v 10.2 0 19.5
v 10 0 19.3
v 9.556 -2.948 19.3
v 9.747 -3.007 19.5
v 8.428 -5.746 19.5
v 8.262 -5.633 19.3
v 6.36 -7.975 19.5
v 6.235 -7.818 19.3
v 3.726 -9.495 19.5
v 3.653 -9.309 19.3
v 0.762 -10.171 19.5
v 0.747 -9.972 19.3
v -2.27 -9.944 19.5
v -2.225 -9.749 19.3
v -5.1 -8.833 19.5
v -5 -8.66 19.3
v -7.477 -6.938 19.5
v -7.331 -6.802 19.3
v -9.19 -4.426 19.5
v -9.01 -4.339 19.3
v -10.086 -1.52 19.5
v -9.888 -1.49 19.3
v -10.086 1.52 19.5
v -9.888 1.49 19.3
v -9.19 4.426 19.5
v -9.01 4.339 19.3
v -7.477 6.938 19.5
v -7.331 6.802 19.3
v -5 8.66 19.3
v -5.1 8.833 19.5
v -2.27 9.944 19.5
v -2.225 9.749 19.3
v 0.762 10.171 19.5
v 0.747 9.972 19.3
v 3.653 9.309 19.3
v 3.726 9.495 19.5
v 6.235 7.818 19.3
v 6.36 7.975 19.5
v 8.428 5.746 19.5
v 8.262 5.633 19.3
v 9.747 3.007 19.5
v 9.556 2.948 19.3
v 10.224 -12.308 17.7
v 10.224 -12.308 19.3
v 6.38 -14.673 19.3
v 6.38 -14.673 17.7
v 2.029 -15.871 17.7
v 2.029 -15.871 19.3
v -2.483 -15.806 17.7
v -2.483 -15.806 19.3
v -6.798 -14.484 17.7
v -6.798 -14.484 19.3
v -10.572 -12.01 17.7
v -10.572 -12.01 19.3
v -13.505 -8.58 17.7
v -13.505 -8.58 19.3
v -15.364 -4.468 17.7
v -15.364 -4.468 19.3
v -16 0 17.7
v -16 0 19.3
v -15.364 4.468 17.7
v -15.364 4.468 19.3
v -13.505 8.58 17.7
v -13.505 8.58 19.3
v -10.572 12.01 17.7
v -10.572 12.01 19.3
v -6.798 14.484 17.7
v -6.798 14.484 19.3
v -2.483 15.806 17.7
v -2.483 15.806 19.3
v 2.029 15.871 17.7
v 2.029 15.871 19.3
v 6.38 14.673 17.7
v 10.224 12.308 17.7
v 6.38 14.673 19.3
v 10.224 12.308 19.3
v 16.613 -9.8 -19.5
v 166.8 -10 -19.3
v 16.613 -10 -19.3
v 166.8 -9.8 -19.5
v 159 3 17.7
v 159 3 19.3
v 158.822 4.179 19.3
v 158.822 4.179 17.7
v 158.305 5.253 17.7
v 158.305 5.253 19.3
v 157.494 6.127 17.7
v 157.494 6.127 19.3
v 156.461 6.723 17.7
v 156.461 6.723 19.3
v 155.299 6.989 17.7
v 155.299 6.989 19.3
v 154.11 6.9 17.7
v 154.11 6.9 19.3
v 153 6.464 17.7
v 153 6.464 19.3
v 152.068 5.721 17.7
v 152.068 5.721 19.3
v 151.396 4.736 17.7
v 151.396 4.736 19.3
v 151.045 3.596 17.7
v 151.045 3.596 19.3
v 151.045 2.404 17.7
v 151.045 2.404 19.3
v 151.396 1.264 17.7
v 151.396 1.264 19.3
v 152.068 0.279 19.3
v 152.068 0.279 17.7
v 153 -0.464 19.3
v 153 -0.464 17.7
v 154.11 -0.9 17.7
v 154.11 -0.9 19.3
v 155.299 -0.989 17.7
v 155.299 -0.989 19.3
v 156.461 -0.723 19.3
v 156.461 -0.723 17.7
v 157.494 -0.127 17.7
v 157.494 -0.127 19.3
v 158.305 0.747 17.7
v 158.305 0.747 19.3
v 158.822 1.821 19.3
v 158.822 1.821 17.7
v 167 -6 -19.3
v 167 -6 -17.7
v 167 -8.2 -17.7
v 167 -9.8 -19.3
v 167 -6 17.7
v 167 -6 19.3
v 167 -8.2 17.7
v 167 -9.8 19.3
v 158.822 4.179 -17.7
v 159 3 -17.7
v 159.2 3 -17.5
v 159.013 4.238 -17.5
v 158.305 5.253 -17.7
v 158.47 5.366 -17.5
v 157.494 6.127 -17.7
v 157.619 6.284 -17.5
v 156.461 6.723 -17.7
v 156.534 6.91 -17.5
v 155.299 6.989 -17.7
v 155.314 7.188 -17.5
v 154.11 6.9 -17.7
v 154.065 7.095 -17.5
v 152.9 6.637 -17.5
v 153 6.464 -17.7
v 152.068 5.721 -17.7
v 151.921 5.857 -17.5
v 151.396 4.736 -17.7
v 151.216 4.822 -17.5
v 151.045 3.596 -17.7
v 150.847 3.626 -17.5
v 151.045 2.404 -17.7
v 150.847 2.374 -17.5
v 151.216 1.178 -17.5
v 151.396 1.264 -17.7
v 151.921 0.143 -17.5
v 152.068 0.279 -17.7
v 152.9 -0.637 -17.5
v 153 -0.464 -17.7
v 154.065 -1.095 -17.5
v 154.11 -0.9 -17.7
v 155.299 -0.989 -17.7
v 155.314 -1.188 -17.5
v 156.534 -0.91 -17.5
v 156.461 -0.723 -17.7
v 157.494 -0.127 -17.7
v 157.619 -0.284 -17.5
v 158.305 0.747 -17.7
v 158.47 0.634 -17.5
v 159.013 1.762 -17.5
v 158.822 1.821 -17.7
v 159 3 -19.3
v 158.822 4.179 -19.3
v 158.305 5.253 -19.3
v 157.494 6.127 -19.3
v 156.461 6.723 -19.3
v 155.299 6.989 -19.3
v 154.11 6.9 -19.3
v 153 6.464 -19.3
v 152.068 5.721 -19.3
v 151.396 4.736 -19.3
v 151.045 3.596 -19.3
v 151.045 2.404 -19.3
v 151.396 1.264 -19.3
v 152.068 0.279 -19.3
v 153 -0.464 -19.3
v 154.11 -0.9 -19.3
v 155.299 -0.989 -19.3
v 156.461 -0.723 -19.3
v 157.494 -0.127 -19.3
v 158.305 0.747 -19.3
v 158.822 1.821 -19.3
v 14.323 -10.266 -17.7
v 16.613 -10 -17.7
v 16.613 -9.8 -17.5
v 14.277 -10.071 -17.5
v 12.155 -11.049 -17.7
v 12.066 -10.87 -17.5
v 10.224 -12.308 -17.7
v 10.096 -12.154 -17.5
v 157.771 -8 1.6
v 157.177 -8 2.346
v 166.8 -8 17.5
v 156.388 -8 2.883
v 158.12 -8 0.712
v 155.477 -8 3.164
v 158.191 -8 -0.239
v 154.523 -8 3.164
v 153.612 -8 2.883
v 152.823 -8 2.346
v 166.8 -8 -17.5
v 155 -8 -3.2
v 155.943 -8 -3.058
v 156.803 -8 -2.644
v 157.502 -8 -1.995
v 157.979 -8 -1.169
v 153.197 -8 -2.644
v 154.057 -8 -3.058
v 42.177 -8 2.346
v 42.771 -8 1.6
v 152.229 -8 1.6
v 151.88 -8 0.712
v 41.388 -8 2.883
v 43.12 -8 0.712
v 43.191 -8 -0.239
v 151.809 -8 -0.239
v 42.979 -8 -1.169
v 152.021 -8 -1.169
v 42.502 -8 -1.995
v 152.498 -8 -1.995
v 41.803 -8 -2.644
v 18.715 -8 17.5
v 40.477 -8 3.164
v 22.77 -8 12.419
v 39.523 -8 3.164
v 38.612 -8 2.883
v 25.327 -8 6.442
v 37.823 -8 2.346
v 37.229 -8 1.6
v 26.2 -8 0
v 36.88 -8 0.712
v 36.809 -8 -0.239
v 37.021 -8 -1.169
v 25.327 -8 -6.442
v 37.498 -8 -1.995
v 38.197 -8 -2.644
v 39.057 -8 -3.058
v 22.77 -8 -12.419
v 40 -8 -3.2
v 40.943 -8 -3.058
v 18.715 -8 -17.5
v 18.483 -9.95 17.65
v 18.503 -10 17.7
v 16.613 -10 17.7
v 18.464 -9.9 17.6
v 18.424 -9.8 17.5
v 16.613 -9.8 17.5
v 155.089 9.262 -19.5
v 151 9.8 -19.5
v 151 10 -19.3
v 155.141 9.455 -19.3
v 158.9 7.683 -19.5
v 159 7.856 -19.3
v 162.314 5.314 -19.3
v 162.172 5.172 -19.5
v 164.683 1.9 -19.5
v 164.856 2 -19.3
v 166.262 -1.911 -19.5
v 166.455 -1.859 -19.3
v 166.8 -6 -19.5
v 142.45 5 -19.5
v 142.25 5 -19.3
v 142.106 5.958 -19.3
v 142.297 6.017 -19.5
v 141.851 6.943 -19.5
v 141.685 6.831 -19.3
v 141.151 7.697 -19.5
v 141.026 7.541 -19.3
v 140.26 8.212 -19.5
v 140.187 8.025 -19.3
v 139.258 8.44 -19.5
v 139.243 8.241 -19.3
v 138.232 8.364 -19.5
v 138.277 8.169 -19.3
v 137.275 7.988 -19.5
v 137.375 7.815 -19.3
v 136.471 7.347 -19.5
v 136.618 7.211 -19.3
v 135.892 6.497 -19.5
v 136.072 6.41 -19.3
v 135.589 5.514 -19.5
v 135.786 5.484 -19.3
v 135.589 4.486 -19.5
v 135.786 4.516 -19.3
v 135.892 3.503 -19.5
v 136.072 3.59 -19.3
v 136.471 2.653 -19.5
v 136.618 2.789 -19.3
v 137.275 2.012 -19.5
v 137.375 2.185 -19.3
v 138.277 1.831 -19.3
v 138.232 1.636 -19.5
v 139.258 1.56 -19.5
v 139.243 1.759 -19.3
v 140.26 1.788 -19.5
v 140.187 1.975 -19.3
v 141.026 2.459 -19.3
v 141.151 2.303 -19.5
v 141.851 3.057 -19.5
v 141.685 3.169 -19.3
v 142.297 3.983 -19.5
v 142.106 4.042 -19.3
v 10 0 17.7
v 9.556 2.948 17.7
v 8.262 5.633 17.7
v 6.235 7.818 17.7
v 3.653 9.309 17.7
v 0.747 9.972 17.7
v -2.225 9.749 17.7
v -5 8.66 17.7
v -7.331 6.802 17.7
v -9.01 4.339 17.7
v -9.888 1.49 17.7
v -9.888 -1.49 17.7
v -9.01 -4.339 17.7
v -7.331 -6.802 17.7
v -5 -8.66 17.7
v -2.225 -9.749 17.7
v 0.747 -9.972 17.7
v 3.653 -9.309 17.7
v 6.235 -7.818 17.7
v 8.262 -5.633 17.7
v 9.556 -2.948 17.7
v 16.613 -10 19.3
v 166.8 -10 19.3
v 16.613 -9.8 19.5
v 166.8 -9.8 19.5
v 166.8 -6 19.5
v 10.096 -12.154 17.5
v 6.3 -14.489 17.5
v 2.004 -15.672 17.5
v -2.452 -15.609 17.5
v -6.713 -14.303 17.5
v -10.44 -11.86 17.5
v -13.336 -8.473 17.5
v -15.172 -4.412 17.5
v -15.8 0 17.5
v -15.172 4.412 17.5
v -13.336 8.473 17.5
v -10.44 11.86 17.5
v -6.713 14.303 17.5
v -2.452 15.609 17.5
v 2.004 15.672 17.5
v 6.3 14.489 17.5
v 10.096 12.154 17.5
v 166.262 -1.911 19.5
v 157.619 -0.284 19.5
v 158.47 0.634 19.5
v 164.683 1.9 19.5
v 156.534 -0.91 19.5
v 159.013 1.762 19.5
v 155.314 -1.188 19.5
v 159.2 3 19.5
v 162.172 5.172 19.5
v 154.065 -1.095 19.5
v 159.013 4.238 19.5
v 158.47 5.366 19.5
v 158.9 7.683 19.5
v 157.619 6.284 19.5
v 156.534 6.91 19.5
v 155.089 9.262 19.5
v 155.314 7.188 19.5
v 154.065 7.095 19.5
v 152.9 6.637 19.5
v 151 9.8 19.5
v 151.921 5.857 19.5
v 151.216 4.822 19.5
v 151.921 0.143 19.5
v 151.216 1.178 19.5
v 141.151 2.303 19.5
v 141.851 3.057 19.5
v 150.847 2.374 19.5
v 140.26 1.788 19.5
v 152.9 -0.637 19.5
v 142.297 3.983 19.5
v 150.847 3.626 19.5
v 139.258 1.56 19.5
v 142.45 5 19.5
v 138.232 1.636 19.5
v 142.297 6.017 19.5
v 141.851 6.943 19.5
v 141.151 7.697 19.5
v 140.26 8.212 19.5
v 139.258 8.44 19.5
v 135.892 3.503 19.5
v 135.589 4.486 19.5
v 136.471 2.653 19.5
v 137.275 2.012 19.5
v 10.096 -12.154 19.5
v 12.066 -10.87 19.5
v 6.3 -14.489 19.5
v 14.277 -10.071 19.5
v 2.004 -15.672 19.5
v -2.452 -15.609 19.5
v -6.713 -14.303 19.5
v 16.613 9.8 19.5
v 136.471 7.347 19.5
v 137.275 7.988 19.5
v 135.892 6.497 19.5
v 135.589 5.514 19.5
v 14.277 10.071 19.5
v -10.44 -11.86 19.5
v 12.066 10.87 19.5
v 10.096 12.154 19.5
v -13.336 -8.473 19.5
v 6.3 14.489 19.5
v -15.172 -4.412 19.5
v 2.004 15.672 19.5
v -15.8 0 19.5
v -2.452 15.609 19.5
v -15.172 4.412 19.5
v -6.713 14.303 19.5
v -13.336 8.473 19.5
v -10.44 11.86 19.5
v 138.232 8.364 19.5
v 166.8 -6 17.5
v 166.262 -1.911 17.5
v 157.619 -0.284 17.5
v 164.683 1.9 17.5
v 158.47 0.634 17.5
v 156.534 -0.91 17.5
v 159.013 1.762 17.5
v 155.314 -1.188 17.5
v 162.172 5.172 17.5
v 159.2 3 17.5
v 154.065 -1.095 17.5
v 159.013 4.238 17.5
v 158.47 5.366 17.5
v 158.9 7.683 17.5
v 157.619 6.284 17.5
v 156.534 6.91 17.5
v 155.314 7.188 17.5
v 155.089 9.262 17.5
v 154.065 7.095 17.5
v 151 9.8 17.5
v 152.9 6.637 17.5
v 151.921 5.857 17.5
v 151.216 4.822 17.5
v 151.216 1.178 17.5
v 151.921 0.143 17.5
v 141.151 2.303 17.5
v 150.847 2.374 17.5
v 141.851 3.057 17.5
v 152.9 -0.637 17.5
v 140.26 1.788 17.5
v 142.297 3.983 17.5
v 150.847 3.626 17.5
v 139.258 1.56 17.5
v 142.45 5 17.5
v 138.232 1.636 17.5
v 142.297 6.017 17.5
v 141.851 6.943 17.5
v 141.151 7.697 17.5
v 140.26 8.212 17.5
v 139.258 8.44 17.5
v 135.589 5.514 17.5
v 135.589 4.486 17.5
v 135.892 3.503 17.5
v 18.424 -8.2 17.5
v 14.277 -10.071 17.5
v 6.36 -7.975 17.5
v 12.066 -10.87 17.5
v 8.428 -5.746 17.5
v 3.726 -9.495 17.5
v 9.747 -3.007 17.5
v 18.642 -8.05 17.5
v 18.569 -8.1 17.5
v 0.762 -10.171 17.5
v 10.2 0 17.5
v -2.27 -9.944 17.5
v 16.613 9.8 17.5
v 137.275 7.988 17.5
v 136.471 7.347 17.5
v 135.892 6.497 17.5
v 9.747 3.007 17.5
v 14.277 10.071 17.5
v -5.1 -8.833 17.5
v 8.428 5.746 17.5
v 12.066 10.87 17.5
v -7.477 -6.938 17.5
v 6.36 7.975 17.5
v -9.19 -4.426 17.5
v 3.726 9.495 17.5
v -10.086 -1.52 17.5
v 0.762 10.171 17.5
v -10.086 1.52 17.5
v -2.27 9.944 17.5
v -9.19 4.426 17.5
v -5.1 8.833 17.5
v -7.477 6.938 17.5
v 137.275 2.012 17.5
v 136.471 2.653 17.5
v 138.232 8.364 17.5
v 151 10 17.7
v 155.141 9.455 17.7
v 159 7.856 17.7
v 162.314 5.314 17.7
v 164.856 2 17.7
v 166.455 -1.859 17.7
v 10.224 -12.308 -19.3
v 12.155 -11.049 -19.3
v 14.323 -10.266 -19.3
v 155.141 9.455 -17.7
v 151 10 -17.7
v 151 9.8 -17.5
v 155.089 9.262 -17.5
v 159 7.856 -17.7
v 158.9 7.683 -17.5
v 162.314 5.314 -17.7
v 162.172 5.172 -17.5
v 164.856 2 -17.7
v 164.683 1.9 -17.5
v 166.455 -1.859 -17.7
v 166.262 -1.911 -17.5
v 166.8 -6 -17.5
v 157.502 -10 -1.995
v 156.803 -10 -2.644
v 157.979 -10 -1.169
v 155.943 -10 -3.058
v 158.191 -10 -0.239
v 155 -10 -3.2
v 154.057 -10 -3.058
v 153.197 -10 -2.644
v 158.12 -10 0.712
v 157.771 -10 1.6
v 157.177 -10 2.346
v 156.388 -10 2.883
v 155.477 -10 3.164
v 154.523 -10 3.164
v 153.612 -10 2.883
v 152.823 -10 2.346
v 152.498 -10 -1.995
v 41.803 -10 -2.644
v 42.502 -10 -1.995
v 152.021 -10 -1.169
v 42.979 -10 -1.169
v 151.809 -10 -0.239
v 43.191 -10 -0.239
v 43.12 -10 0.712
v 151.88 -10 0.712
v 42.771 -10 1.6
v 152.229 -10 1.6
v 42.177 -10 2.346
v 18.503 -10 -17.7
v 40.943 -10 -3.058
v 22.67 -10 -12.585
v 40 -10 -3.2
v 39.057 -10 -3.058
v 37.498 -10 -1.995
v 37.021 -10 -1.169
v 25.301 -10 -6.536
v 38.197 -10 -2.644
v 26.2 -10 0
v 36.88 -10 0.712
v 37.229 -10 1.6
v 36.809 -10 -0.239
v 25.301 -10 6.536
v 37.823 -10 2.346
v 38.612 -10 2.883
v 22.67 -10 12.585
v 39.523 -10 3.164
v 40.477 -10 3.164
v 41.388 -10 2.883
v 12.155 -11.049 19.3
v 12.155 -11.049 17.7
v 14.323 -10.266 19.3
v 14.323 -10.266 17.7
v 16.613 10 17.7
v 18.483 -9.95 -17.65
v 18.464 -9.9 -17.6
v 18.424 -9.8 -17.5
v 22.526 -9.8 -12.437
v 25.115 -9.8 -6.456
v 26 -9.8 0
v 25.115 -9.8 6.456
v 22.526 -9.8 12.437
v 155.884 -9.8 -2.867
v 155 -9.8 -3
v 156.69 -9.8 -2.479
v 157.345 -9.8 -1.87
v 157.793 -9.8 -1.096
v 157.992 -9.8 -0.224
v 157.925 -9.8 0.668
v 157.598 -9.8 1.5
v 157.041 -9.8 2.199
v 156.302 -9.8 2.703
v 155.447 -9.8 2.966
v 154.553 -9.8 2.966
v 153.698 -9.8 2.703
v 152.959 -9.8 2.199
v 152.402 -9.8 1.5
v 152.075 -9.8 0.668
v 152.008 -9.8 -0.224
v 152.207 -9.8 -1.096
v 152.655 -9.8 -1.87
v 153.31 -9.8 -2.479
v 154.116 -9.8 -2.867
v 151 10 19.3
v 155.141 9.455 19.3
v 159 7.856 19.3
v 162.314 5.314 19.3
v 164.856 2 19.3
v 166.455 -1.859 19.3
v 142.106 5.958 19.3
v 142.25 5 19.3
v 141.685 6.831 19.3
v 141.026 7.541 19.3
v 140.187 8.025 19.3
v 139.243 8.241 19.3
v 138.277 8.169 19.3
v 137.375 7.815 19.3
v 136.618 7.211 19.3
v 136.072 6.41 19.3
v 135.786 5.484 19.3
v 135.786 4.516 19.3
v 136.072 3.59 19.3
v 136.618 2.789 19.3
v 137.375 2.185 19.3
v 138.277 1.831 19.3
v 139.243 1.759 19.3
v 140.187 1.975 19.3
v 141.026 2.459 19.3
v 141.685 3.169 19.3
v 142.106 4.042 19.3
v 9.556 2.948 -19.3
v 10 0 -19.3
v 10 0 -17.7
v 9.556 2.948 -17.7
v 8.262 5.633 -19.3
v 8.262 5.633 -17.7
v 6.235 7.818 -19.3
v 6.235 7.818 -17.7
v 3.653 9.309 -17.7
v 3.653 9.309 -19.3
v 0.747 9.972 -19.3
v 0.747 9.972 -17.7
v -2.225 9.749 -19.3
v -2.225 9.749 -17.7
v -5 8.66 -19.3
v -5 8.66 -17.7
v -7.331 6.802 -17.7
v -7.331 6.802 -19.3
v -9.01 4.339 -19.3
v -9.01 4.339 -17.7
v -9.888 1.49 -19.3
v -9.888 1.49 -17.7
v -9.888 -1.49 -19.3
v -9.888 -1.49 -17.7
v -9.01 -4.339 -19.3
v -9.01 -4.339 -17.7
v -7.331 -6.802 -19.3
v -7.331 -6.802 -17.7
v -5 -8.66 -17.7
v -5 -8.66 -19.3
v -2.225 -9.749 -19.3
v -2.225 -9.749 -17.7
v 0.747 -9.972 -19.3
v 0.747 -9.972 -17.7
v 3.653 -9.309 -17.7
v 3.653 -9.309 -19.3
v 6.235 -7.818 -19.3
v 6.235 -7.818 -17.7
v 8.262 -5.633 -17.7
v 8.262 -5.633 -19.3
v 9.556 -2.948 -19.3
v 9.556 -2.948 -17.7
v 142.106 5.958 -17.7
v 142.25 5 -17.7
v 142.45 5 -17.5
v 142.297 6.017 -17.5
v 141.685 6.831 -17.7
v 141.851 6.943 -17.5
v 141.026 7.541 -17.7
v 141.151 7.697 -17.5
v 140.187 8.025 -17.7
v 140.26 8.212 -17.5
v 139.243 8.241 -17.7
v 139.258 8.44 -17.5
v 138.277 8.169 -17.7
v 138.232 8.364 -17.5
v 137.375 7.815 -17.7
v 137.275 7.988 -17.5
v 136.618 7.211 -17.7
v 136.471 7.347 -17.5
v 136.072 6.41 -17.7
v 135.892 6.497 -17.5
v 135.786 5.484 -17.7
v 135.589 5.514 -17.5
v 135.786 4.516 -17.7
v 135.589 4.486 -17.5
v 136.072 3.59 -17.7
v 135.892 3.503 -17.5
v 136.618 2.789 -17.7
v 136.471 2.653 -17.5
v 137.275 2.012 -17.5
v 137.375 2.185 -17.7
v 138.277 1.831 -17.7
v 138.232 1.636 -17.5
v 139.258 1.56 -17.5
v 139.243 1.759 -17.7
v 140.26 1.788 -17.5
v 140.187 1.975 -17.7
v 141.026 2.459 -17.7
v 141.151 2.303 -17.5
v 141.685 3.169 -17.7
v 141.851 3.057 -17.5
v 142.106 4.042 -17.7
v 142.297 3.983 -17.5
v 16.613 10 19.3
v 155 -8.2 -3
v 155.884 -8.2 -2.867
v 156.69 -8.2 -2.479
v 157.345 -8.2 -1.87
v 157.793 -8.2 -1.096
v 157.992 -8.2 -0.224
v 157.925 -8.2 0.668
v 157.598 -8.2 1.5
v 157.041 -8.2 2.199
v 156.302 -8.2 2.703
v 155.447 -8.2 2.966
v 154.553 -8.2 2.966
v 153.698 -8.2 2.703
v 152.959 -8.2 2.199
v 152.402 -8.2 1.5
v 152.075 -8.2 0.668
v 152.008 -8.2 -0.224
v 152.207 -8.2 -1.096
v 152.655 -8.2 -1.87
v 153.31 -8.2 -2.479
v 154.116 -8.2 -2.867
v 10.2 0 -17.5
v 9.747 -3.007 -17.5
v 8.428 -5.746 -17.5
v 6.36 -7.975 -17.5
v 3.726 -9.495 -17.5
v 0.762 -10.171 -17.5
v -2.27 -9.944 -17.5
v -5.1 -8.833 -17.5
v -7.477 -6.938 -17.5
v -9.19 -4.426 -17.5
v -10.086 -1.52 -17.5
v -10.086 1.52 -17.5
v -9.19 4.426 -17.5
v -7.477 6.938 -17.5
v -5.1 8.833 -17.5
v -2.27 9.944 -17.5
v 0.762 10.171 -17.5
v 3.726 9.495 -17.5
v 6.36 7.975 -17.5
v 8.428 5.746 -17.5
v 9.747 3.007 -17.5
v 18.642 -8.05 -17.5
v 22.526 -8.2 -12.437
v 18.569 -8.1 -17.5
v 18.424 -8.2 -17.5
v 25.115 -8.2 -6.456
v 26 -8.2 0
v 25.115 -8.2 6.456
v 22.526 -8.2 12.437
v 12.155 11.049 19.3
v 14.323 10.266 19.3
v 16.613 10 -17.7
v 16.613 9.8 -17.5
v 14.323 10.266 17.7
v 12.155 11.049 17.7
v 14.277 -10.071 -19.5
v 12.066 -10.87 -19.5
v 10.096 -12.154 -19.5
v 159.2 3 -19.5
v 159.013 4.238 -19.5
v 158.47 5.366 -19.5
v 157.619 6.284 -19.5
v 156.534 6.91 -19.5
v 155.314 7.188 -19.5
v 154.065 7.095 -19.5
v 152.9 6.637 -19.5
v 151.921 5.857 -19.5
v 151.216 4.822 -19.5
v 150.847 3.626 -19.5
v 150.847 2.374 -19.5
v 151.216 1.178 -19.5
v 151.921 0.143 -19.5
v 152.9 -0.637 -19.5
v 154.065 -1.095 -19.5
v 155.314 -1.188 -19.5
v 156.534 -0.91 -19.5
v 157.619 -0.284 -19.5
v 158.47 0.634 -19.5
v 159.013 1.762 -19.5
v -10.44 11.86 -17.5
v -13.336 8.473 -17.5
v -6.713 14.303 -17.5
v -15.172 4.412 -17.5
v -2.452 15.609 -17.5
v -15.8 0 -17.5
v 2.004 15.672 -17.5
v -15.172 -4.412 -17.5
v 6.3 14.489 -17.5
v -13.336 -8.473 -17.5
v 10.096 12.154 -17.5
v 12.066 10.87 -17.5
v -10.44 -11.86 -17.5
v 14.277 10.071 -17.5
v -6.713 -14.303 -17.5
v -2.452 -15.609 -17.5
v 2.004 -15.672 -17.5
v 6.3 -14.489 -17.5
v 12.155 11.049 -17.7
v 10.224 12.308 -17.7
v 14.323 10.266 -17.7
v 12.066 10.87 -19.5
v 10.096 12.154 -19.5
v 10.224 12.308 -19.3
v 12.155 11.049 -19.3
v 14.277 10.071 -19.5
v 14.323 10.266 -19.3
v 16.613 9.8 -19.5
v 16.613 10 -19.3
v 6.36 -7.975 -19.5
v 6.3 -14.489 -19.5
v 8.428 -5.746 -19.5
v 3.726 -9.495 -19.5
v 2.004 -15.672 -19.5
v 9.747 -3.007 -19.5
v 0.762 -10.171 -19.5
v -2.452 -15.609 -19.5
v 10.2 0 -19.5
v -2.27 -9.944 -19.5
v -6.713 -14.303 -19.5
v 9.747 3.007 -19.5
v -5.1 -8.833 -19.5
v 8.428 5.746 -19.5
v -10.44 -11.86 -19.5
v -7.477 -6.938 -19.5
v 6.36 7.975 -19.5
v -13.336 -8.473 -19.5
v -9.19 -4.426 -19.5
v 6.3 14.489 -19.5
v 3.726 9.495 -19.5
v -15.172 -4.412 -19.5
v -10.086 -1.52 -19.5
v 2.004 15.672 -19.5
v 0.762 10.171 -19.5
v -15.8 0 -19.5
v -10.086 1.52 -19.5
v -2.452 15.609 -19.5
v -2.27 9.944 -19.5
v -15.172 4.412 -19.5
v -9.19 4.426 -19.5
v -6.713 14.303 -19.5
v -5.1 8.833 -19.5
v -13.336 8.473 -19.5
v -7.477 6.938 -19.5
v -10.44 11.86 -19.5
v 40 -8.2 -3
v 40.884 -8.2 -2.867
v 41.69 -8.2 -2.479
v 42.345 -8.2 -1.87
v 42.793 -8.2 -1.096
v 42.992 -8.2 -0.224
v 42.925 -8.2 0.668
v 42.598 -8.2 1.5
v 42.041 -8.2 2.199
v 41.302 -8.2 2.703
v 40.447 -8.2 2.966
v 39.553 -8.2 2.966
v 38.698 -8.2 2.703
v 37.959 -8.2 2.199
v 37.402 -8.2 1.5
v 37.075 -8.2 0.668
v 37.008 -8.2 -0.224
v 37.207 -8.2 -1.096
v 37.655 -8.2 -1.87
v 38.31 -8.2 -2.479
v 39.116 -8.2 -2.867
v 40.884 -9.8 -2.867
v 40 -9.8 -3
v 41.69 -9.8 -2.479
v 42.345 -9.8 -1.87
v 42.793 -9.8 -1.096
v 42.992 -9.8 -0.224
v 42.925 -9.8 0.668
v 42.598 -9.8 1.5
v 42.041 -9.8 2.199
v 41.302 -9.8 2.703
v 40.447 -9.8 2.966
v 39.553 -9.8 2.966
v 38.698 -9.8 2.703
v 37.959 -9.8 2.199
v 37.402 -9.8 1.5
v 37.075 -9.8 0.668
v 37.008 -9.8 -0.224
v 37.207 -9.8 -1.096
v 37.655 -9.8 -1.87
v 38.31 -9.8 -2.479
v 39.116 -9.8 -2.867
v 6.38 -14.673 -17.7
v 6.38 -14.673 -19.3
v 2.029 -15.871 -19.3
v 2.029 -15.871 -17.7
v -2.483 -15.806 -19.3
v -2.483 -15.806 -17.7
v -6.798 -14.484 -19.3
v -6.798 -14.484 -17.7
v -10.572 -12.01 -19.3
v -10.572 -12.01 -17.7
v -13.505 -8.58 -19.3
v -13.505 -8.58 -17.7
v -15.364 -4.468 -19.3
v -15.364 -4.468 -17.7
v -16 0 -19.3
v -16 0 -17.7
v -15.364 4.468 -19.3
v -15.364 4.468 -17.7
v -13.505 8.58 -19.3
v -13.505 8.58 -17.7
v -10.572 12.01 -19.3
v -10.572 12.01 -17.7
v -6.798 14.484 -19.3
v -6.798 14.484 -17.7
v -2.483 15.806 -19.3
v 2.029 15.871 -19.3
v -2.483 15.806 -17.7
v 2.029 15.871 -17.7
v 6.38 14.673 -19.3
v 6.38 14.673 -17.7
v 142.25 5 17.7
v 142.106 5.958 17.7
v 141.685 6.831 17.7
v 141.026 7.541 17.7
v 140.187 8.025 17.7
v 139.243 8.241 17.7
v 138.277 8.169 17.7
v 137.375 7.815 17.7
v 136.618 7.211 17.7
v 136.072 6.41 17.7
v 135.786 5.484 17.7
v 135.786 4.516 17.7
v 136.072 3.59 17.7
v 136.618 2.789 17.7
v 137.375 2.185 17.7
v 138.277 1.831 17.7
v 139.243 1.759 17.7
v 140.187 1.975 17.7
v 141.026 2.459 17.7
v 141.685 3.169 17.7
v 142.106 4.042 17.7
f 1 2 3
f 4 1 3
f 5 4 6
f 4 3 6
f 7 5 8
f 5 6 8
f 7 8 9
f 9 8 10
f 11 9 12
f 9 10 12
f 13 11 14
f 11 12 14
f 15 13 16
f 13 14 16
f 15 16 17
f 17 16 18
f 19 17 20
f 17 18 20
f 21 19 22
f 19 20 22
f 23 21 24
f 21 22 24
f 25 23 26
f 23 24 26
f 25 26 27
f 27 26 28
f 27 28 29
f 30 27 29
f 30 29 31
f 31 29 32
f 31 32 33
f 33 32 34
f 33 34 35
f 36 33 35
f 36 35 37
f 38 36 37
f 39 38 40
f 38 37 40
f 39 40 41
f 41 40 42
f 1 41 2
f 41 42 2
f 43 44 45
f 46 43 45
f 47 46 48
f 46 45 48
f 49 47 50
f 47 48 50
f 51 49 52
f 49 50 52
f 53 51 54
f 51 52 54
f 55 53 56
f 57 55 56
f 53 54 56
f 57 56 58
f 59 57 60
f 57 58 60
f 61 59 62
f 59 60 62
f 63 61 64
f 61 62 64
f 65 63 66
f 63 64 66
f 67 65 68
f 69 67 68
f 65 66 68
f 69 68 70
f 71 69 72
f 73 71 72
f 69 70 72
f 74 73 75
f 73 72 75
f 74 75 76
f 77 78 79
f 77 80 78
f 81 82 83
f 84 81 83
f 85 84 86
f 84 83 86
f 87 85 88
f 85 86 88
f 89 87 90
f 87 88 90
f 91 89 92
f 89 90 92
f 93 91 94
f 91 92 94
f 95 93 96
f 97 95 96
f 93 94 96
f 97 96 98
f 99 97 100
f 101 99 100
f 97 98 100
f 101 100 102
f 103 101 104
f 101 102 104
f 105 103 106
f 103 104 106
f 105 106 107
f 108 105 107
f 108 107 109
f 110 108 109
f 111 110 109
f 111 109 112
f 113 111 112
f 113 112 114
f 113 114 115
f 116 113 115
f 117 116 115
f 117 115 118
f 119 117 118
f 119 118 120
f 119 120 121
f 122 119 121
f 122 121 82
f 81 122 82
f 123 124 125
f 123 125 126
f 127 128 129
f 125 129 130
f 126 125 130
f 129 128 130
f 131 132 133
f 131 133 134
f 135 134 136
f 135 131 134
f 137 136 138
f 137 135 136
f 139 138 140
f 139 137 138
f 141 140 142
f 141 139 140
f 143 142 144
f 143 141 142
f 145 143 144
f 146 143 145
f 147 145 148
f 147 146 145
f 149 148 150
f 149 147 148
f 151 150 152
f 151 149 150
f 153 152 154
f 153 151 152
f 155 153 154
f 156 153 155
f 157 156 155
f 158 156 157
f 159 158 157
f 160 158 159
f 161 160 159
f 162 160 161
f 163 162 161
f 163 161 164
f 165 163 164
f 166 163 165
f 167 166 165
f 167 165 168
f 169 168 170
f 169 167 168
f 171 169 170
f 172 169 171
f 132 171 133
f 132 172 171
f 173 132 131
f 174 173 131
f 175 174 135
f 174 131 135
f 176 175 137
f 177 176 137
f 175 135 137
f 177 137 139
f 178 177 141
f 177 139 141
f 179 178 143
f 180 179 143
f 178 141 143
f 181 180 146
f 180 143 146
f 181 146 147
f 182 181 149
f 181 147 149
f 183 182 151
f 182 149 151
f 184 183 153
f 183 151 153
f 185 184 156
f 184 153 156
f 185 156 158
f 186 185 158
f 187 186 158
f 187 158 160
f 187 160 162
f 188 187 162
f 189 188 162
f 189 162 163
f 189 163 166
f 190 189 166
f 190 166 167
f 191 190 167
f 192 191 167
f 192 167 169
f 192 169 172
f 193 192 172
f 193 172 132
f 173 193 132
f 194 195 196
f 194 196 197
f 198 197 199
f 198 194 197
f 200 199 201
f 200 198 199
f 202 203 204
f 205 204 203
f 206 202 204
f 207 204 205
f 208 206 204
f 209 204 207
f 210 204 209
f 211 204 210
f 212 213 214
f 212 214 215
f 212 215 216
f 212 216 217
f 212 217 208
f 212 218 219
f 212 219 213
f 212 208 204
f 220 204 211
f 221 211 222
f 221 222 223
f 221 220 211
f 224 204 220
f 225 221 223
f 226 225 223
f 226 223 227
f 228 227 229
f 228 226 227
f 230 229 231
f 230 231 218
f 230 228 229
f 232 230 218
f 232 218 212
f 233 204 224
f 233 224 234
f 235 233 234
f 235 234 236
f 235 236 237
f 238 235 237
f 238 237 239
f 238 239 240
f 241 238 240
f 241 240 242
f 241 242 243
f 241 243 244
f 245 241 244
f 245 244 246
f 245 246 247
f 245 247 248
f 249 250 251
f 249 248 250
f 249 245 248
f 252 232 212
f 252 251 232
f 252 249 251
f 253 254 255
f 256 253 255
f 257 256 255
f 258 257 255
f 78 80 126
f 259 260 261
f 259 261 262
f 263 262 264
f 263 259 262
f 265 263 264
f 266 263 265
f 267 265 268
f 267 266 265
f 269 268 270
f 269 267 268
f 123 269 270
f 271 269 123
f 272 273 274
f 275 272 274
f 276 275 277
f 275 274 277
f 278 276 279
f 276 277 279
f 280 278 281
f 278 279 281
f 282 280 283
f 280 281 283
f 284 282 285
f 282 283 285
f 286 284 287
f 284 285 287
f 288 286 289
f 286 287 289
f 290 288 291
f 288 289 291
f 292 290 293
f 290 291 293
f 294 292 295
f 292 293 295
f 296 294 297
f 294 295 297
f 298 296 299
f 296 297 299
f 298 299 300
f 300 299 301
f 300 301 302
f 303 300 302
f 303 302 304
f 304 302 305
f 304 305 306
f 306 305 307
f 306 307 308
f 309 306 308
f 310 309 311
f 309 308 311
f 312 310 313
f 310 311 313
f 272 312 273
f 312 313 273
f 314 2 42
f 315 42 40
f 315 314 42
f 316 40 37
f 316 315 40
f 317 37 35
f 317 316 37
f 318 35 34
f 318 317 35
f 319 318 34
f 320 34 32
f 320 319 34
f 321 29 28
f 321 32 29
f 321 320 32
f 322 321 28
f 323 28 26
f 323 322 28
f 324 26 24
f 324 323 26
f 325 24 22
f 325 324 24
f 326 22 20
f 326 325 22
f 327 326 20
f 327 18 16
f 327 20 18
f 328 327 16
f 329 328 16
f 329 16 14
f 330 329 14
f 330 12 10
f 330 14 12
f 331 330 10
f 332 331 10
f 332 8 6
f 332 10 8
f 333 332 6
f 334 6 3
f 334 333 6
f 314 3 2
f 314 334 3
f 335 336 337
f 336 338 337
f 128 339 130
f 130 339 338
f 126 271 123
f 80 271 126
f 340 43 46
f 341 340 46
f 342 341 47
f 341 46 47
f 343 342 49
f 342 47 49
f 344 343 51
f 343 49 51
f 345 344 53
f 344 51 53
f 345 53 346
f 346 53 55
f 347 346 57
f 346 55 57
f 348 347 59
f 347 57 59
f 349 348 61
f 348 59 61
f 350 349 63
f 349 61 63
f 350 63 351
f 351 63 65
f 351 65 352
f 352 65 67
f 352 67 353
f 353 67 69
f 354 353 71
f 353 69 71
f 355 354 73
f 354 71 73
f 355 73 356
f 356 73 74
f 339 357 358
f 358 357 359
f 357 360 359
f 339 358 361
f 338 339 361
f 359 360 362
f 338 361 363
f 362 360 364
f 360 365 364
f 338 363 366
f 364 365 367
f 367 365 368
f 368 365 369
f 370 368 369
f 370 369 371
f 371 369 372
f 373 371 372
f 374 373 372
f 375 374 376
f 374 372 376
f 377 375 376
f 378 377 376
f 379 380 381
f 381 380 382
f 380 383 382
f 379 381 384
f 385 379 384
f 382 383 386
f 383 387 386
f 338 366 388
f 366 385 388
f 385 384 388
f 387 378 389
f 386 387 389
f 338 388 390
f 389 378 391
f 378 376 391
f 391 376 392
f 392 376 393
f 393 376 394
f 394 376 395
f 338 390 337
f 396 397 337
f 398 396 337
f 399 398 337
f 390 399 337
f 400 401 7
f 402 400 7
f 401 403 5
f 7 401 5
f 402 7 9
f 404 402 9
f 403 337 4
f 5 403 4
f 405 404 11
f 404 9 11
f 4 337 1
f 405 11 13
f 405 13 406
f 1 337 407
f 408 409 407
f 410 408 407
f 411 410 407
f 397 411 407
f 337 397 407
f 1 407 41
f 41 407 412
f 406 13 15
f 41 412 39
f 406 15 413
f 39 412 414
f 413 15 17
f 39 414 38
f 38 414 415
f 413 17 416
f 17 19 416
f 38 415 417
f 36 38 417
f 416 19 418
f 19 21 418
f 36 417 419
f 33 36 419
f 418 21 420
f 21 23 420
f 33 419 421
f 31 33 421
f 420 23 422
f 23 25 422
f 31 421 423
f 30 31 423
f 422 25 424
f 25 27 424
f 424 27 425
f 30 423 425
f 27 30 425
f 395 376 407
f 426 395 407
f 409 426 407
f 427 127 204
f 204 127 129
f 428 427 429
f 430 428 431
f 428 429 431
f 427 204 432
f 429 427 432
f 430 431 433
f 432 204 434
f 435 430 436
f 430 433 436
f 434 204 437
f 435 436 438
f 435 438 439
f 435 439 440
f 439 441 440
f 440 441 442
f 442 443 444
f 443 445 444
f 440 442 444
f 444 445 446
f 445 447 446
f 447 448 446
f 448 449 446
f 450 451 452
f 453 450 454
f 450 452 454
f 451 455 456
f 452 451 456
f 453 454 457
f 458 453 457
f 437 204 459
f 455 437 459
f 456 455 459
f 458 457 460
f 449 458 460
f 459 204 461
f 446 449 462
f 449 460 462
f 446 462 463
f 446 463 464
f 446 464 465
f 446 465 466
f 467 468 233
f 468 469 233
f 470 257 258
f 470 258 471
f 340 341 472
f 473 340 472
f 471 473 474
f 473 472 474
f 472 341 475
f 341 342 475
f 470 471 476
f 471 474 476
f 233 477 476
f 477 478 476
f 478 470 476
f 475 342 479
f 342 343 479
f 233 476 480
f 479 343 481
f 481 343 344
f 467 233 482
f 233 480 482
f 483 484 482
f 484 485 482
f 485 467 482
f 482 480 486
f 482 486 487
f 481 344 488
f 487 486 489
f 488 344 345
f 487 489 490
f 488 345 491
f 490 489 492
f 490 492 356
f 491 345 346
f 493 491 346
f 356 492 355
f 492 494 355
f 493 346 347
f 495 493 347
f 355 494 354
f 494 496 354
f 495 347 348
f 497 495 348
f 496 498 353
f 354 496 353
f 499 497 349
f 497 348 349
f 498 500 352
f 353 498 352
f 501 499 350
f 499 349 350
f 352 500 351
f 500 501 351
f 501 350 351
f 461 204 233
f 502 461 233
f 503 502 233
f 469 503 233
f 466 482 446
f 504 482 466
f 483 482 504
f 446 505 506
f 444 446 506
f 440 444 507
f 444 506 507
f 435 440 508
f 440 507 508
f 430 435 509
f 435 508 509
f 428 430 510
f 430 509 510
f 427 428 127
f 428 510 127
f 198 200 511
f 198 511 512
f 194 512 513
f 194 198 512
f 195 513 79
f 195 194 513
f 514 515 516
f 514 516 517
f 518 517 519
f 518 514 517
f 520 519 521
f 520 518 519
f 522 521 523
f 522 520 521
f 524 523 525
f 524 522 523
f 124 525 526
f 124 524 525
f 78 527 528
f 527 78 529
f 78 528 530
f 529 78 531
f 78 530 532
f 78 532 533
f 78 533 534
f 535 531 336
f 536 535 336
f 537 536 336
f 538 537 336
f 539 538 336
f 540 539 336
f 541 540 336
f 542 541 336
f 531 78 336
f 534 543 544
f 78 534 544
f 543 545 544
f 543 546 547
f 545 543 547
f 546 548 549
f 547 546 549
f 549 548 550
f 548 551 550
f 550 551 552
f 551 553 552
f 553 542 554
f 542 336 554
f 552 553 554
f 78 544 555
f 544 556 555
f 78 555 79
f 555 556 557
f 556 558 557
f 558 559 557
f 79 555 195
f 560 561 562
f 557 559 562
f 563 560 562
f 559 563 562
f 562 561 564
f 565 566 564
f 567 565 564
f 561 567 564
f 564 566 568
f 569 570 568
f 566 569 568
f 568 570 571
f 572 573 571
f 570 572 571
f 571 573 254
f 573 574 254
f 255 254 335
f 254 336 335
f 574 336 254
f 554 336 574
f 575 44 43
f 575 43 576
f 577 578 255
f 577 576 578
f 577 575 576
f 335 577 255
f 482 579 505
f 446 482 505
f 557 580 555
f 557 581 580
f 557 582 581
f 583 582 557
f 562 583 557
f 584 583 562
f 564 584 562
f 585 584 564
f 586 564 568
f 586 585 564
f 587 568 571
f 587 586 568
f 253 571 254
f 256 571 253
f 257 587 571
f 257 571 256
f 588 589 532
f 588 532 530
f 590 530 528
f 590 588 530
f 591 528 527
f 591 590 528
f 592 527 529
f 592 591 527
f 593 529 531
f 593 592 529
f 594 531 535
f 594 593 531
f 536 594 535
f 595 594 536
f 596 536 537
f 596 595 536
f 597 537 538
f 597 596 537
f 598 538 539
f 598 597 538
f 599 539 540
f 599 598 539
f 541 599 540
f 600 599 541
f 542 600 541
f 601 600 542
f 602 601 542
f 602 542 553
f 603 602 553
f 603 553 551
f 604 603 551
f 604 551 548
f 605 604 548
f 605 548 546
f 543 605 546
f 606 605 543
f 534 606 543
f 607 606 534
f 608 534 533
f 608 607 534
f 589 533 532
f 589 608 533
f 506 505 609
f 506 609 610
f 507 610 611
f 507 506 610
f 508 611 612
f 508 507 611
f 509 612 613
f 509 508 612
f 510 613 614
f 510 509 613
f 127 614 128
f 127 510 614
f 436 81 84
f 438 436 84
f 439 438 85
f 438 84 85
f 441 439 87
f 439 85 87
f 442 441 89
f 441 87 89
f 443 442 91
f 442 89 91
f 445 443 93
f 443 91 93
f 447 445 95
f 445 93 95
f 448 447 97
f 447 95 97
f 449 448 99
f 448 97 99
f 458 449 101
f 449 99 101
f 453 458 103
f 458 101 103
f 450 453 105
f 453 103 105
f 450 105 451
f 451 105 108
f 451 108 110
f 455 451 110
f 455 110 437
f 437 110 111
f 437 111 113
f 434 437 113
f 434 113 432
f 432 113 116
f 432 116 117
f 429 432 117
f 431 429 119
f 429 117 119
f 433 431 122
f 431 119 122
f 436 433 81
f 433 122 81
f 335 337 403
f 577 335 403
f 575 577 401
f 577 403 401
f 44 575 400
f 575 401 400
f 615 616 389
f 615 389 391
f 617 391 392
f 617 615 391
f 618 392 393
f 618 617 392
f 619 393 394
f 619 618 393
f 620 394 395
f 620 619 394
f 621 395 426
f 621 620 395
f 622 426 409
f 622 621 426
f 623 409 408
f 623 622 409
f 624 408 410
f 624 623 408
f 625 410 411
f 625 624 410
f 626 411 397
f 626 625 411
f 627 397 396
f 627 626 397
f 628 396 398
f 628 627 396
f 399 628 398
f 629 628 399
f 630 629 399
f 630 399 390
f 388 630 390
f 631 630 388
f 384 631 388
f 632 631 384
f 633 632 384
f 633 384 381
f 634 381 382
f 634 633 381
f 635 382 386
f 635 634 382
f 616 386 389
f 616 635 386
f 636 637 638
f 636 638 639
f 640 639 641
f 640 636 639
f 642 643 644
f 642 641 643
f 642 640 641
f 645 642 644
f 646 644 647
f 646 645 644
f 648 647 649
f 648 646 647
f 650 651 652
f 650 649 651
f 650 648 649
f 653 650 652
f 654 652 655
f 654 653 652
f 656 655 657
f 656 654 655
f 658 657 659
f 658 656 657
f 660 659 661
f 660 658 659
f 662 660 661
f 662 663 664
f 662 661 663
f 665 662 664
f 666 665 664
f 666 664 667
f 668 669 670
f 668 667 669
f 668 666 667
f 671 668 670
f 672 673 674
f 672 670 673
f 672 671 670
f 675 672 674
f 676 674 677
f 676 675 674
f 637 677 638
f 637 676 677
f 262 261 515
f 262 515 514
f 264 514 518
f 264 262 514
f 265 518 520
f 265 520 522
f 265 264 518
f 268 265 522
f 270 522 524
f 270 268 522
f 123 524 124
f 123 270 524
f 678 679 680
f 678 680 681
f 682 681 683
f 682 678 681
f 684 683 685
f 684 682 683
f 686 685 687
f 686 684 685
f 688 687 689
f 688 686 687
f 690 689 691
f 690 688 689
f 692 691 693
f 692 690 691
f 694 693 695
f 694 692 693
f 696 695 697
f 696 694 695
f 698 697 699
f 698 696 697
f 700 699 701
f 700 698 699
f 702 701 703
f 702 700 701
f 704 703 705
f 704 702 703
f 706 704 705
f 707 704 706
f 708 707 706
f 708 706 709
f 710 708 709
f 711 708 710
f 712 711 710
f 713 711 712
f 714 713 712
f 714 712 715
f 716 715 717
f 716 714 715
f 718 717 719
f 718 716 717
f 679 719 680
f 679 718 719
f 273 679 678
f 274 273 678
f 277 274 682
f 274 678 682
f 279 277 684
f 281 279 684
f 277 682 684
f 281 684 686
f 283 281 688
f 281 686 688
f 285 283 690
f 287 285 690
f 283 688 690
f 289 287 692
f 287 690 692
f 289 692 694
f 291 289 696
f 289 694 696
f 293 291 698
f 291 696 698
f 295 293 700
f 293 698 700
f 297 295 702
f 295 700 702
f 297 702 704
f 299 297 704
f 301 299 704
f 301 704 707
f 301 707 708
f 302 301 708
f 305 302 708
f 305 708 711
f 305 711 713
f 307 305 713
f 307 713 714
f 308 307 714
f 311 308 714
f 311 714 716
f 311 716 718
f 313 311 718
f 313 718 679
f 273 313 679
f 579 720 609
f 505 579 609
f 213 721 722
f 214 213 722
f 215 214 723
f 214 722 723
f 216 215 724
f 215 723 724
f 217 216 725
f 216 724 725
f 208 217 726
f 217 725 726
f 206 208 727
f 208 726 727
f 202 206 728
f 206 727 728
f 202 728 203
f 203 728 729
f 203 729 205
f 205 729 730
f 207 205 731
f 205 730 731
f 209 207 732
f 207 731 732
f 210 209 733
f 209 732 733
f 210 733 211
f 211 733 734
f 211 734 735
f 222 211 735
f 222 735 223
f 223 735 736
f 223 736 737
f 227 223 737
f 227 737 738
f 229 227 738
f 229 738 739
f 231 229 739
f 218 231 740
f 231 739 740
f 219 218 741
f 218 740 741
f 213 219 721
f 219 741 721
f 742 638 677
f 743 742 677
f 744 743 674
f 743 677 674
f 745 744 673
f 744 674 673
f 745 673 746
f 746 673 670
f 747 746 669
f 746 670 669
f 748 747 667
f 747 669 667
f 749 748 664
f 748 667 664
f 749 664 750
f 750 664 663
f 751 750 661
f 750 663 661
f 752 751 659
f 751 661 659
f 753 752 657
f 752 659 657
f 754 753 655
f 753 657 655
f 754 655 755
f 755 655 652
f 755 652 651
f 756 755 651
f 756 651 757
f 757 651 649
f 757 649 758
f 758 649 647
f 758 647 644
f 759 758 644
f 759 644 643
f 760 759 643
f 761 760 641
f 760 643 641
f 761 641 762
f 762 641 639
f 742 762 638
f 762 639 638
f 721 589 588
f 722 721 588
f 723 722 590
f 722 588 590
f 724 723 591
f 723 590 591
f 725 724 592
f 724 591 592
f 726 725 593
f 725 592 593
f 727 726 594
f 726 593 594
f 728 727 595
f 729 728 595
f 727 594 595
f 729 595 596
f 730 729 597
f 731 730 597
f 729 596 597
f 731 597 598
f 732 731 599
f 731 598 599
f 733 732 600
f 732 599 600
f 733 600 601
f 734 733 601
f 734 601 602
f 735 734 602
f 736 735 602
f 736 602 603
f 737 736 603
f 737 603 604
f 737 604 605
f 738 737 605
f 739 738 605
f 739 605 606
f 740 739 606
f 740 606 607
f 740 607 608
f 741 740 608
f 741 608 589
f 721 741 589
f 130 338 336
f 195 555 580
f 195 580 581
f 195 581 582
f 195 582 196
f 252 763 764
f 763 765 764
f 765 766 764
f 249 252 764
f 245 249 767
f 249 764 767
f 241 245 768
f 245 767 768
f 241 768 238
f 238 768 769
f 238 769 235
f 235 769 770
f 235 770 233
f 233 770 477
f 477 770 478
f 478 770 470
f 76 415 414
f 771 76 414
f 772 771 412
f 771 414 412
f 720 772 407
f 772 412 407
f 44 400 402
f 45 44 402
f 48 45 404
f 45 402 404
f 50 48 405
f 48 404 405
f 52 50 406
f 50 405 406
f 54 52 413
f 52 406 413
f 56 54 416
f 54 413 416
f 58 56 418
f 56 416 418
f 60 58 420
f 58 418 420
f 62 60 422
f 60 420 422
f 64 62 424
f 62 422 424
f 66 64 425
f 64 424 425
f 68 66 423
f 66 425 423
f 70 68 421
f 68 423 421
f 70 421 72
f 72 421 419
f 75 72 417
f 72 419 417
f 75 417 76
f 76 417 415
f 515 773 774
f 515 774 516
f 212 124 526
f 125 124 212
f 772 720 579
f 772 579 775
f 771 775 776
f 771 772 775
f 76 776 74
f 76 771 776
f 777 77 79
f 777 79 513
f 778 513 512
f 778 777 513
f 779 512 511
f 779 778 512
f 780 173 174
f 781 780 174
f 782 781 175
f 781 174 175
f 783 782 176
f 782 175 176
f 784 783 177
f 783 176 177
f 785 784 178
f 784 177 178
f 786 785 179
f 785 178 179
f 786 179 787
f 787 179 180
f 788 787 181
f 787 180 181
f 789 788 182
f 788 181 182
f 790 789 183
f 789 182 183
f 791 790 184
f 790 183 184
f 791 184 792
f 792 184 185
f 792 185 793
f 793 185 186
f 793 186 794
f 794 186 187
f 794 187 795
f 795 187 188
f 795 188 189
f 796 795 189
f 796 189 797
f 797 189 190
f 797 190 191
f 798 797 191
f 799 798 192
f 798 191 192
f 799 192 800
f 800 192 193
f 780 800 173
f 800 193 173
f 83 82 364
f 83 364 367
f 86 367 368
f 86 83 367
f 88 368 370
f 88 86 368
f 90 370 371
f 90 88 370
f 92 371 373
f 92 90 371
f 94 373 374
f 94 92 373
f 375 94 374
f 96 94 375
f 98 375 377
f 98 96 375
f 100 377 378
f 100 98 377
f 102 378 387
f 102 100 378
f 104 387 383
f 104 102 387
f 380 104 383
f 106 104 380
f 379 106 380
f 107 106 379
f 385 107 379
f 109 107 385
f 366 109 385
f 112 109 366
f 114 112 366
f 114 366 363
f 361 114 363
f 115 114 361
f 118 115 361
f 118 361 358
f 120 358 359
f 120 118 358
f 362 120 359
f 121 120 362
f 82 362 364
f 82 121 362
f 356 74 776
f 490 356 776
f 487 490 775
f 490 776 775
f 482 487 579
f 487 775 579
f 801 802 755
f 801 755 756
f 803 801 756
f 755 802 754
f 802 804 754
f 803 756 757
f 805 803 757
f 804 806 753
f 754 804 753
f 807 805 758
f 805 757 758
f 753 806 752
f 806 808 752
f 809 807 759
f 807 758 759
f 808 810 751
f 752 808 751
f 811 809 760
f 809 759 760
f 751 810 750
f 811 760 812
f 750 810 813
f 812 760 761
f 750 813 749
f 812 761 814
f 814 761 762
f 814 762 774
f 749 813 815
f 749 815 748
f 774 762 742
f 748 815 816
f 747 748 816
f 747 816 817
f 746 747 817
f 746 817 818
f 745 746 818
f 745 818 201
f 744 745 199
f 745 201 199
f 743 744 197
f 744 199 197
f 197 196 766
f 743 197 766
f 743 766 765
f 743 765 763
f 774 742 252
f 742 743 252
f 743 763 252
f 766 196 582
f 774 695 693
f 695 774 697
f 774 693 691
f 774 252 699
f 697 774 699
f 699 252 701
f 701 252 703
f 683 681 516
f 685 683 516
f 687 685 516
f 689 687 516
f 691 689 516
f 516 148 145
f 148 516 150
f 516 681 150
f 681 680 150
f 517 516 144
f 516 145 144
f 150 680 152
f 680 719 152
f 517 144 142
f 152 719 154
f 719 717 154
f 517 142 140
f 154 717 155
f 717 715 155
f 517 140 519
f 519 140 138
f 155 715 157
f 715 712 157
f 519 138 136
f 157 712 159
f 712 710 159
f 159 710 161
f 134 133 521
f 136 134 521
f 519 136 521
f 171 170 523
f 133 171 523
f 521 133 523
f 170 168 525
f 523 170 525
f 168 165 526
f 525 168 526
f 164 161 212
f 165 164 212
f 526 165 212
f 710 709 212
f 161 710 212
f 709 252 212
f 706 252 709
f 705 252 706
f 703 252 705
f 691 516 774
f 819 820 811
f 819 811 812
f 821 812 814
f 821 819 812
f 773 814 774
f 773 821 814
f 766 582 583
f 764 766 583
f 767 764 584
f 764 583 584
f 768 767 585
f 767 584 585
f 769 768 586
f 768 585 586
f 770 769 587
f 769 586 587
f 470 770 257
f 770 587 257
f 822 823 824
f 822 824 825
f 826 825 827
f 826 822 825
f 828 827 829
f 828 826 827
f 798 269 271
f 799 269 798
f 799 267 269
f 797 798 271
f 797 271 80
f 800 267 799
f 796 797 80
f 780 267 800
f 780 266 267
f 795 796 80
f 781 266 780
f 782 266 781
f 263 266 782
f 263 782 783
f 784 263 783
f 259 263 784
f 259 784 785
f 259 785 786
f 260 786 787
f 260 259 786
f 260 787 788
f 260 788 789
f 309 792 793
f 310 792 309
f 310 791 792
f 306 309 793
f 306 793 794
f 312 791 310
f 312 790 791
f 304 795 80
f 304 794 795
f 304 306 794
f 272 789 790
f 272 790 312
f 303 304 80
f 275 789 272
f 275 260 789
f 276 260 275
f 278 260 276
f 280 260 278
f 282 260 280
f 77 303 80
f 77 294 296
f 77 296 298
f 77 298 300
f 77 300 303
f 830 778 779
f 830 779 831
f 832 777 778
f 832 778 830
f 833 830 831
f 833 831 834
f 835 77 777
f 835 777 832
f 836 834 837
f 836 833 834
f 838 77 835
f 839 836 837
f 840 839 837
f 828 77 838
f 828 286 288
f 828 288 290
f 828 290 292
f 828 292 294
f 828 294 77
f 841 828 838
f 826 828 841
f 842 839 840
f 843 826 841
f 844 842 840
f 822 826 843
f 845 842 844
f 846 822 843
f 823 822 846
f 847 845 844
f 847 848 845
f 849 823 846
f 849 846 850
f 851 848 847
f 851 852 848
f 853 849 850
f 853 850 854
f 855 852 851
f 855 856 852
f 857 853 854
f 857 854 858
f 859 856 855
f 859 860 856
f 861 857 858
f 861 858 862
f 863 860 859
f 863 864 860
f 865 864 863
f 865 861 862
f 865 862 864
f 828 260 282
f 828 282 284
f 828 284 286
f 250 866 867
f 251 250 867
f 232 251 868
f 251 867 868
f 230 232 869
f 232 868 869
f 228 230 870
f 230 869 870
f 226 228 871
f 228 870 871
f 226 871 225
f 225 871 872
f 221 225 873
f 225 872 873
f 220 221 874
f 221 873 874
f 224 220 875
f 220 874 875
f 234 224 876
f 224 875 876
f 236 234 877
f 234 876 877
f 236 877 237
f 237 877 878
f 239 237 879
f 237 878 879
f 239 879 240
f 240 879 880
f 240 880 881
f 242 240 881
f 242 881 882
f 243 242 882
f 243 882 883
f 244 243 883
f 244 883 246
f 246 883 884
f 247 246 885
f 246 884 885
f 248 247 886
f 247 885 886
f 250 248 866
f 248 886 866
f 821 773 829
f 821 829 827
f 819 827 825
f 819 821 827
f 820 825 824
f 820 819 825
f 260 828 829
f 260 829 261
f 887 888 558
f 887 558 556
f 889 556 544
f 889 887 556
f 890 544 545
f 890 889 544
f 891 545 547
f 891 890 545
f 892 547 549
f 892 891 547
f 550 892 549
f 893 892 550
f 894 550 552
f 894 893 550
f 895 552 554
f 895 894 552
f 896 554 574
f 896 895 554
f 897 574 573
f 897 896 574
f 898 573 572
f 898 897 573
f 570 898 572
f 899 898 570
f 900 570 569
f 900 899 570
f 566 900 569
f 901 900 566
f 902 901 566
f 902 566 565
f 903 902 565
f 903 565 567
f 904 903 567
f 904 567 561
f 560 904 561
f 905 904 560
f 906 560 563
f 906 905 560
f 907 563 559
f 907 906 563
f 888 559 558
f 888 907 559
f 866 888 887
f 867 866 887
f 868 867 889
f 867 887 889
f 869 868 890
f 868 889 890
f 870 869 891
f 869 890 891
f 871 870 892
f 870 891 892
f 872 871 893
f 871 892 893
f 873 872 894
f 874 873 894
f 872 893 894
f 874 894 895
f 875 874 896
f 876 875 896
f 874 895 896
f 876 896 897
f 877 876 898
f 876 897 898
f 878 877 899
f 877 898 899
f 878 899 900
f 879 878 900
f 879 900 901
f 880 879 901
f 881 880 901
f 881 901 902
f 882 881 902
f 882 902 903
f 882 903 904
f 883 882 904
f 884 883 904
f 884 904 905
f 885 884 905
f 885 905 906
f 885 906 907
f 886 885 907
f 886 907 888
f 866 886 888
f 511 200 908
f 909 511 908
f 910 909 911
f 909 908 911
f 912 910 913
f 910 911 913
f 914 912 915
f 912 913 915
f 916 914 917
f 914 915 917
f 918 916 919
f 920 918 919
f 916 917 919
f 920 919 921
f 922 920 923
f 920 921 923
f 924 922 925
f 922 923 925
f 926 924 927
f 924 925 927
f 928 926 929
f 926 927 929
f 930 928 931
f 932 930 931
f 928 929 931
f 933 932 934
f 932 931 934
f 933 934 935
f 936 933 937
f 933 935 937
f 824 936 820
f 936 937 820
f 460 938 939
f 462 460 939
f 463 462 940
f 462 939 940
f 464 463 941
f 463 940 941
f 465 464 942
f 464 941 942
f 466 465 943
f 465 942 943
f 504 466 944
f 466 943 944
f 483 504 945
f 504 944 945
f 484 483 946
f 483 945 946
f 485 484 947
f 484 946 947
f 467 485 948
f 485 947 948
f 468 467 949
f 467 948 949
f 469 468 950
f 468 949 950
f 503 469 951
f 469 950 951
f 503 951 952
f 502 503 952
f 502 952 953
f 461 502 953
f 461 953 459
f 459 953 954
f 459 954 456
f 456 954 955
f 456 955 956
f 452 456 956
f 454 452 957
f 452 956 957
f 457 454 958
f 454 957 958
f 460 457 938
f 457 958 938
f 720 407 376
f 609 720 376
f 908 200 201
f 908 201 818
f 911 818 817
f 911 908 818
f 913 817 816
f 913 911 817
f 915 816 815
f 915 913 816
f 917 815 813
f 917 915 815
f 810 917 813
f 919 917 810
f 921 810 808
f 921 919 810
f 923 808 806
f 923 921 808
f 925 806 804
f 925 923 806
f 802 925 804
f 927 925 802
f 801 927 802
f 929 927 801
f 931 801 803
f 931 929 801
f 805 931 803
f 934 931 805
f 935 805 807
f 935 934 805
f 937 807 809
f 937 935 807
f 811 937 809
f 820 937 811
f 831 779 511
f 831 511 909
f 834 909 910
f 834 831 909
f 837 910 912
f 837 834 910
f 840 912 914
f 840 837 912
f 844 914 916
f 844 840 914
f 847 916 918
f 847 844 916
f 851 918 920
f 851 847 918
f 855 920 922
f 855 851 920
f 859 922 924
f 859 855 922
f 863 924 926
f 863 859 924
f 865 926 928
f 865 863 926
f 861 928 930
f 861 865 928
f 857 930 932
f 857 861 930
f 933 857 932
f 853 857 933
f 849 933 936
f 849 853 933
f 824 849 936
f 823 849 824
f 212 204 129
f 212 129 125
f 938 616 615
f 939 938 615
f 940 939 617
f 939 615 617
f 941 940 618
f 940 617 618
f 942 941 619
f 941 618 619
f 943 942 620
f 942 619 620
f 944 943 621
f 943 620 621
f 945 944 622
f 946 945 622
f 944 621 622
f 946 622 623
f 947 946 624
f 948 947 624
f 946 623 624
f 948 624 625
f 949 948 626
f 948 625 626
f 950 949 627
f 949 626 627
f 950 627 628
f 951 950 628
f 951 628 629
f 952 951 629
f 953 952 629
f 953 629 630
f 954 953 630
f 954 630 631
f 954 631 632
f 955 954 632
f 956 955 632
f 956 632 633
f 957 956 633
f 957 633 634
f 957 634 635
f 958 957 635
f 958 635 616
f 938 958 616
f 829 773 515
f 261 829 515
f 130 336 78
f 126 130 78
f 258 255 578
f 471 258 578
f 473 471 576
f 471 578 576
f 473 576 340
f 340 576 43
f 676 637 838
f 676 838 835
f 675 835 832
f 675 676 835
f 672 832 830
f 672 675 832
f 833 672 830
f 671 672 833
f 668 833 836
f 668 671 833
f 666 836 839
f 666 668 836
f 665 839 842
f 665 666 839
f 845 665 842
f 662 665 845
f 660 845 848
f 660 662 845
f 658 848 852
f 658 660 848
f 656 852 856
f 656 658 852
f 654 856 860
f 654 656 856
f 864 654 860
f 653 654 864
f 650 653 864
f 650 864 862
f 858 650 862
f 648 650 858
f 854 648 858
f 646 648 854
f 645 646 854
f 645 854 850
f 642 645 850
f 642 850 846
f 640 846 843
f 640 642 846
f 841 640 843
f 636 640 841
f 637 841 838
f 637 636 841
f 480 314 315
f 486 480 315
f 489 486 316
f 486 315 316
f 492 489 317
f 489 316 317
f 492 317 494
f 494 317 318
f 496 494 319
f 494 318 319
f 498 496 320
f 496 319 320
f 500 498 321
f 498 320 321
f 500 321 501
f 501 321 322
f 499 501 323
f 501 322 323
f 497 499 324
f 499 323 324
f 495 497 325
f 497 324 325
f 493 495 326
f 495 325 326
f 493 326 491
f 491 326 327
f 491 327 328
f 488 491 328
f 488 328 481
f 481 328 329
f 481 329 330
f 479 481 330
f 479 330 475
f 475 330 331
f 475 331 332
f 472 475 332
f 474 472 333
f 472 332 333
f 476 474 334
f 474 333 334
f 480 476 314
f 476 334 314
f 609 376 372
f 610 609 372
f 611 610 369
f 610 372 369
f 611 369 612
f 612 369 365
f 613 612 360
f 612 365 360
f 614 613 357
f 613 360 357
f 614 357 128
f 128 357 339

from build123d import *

# Parameters (mm, degrees)
ARMB_W_DEPTH             = 19.5
FILLET_1_R               = 16
FILLET_2_R               = 10
CUT_EXTRUDE_1_DEPTH      = 169.89419765
CUT_EXTRUDE_1_DEPTH_BACK = 169.89419765
SKETCH_2_R               = 10
CUT_EXTRUDE_2_DEPTH      = 169.89419765
CUT_EXTRUDE_2_DEPTH_BACK = 169.89419765
ARMB_T_W                 = 35
ARMB_T_H                 = 18
CUT_EXTRUDE_3_DEPTH      = 169.89419765
SKETCH_5_R               = 4
SKETCH_5_R_2             = 3.25
CUT_EXTRUDE_4_DEPTH      = 173.238207143
SKETCH_6_R               = 3
CUT_EXTRUDE_5_DEPTH      = 171.133036181
CHAMFER_1_SIZE           = 0.2


with BuildPart() as part:
    # ArmB-L → ArmB-W (new, symmetric)
    with BuildSketch(Plane.XY):
        with BuildLine():
            Line((12.489995997, 10), (167, 10))
            Line((167, 10), (167, -10))
            Line((167, -10), (12.489995997, -10))
            ThreePointArc((12.489995997, -10), (-16, 0), (12.489995997, 10))
        make_face()
    extrude(amount=ARMB_W_DEPTH, both=True)

    # ﾌｨﾚｯﾄ1
    fillet_1_edges = [part.edges().sort_by_distance(p)[0] for p in [
        (167, 10, 0),
    ]]
    fillet(fillet_1_edges, radius=FILLET_1_R)

    # ﾌｨﾚｯﾄ2
    fillet_2_edges = [part.edges().sort_by_distance(p)[0] for p in [
        (12.489995997, 10, 0),
        (12.489995997, -10, 0),
    ]]
    fillet(fillet_2_edges, radius=FILLET_2_R)

    # ｽｹｯﾁ2 → ｶｯﾄ - 押し出し1 (cut, two sides: drawn at the far end of the back side and taken through both)
    with BuildSketch(Plane.XY.offset(-CUT_EXTRUDE_1_DEPTH_BACK)):
        Circle(SKETCH_2_R)
    extrude(amount=CUT_EXTRUDE_1_DEPTH + CUT_EXTRUDE_1_DEPTH_BACK, mode=Mode.SUBTRACT)

    # ｽｹｯﾁ3 → ｶｯﾄ - 押し出し2 (cut, two sides: drawn at the far end of the back side and taken through both)
    with BuildSketch(Plane(origin=(0, 0, 0), x_dir=(1, 0, 0), z_dir=(0, 1, 0)).offset(-CUT_EXTRUDE_2_DEPTH_BACK)):
        with BuildLine():
            Line((-16, 17.5), (18.424067706, 17.5))
            ThreePointArc((18.424067706, 17.5), (26, 0), (18.424067706, -17.5))
            Line((18.424067706, -17.5), (-16, -17.5))
            Line((-16, -17.5), (-16, 17.5))
        make_face()
    extrude(amount=CUT_EXTRUDE_2_DEPTH + CUT_EXTRUDE_2_DEPTH_BACK, mode=Mode.SUBTRACT)

    # ArmB-t → ｶｯﾄ - 押し出し3 (cut, through all)
    with BuildSketch(Plane(origin=(0, 0, 0), x_dir=(0, 0, -1), z_dir=(1, 0, 0))):
        with Locations((0, 1)):
            Rectangle(ARMB_T_W, ARMB_T_H)
    extrude(amount=CUT_EXTRUDE_3_DEPTH, mode=Mode.SUBTRACT)

    # ｽｹｯﾁ5 → ｶｯﾄ - 押し出し4 (cut, through all)
    with BuildSketch(Plane.XY.offset(19.5)):
        with Locations((155, 3)):
            Circle(SKETCH_5_R)
        with Locations((139, 5)):
            Circle(SKETCH_5_R_2)
    extrude(amount=-CUT_EXTRUDE_4_DEPTH, mode=Mode.SUBTRACT)

    # ｽｹｯﾁ6 → ｶｯﾄ - 押し出し5 (cut, through all)
    with BuildSketch(Plane.XZ.offset(10)):
        with Locations(Location((155, 0, 0), (0, 0, 270))):
            Circle(SKETCH_6_R)
        with Locations(Location((40, 0, 0), (0, 0, 270))):
            Circle(SKETCH_6_R)
    extrude(amount=-CUT_EXTRUDE_5_DEPTH, mode=Mode.SUBTRACT)

    # 面取り1
    chamfer_1_edges = [part.edges().sort_by_distance(p)[0] for p in [
        (167, -8, 19.5),
        (151, 3, -19.5),
        (151, 3, -17.5),
        (151, 3, 17.5),
        (151, 3, 19.5),
        (135.75, 5, -19.5),
        (135.75, 5, -17.5),
        (135.75, 5, 17.5),
        (135.75, 5, 19.5),
        (155, -8, 3),
        (155, -10, 3),
        (40, -8, 3),
        (40, -10, 3),
        (83.806623863, 10, -19.5),
        (83.806623863, 10, 19.5),
        (162.313708499, 5.313708499, -19.5),
        (162.313708499, 5.313708499, 19.5),
        (91.806623863, -10, -19.5),
        (91.806623863, -10, 19.5),
        (-16, 0, -19.5),
        (-16, 0, 19.5),
        (13.216416623, -10.594600569, -19.5),
        (13.216416623, -10.594600569, 19.5),
        (13.216416623, 10.594600569, -19.5),
        (13.216416623, 10.594600569, 19.5),
        (-10, 0, -19.5),
        (-10, 0, 19.5),
        (167, -8, -19.5),
        (26, -10, 0),
        (-10, 0, -17.5),
        (17.518657716, -10, -17.5),
        (13.216416623, -10.594600569, -17.5),
        (-16, 0, -17.5),
        (13.216416623, 10.594600569, -17.5),
        (83.806623863, 10, -17.5),
        (-10, 0, 17.5),
        (13.216416623, -10.594600569, 17.5),
        (17.518657716, -10, 17.5),
        (83.806623863, 10, 17.5),
        (13.216416623, 10.594600569, 17.5),
        (-16, 0, 17.5),
        (167, -10, 0),
        (162.313708499, 5.313708499, 17.5),
        (162.313708499, 5.313708499, -17.5),
        (26, -8, 0),
        (167, -7, -17.5),
        (167, -7, 17.5),
        (167, -8, 0),
    ]]
    chamfer(chamfer_1_edges, length=CHAMFER_1_SIZE)


solid = part.part
